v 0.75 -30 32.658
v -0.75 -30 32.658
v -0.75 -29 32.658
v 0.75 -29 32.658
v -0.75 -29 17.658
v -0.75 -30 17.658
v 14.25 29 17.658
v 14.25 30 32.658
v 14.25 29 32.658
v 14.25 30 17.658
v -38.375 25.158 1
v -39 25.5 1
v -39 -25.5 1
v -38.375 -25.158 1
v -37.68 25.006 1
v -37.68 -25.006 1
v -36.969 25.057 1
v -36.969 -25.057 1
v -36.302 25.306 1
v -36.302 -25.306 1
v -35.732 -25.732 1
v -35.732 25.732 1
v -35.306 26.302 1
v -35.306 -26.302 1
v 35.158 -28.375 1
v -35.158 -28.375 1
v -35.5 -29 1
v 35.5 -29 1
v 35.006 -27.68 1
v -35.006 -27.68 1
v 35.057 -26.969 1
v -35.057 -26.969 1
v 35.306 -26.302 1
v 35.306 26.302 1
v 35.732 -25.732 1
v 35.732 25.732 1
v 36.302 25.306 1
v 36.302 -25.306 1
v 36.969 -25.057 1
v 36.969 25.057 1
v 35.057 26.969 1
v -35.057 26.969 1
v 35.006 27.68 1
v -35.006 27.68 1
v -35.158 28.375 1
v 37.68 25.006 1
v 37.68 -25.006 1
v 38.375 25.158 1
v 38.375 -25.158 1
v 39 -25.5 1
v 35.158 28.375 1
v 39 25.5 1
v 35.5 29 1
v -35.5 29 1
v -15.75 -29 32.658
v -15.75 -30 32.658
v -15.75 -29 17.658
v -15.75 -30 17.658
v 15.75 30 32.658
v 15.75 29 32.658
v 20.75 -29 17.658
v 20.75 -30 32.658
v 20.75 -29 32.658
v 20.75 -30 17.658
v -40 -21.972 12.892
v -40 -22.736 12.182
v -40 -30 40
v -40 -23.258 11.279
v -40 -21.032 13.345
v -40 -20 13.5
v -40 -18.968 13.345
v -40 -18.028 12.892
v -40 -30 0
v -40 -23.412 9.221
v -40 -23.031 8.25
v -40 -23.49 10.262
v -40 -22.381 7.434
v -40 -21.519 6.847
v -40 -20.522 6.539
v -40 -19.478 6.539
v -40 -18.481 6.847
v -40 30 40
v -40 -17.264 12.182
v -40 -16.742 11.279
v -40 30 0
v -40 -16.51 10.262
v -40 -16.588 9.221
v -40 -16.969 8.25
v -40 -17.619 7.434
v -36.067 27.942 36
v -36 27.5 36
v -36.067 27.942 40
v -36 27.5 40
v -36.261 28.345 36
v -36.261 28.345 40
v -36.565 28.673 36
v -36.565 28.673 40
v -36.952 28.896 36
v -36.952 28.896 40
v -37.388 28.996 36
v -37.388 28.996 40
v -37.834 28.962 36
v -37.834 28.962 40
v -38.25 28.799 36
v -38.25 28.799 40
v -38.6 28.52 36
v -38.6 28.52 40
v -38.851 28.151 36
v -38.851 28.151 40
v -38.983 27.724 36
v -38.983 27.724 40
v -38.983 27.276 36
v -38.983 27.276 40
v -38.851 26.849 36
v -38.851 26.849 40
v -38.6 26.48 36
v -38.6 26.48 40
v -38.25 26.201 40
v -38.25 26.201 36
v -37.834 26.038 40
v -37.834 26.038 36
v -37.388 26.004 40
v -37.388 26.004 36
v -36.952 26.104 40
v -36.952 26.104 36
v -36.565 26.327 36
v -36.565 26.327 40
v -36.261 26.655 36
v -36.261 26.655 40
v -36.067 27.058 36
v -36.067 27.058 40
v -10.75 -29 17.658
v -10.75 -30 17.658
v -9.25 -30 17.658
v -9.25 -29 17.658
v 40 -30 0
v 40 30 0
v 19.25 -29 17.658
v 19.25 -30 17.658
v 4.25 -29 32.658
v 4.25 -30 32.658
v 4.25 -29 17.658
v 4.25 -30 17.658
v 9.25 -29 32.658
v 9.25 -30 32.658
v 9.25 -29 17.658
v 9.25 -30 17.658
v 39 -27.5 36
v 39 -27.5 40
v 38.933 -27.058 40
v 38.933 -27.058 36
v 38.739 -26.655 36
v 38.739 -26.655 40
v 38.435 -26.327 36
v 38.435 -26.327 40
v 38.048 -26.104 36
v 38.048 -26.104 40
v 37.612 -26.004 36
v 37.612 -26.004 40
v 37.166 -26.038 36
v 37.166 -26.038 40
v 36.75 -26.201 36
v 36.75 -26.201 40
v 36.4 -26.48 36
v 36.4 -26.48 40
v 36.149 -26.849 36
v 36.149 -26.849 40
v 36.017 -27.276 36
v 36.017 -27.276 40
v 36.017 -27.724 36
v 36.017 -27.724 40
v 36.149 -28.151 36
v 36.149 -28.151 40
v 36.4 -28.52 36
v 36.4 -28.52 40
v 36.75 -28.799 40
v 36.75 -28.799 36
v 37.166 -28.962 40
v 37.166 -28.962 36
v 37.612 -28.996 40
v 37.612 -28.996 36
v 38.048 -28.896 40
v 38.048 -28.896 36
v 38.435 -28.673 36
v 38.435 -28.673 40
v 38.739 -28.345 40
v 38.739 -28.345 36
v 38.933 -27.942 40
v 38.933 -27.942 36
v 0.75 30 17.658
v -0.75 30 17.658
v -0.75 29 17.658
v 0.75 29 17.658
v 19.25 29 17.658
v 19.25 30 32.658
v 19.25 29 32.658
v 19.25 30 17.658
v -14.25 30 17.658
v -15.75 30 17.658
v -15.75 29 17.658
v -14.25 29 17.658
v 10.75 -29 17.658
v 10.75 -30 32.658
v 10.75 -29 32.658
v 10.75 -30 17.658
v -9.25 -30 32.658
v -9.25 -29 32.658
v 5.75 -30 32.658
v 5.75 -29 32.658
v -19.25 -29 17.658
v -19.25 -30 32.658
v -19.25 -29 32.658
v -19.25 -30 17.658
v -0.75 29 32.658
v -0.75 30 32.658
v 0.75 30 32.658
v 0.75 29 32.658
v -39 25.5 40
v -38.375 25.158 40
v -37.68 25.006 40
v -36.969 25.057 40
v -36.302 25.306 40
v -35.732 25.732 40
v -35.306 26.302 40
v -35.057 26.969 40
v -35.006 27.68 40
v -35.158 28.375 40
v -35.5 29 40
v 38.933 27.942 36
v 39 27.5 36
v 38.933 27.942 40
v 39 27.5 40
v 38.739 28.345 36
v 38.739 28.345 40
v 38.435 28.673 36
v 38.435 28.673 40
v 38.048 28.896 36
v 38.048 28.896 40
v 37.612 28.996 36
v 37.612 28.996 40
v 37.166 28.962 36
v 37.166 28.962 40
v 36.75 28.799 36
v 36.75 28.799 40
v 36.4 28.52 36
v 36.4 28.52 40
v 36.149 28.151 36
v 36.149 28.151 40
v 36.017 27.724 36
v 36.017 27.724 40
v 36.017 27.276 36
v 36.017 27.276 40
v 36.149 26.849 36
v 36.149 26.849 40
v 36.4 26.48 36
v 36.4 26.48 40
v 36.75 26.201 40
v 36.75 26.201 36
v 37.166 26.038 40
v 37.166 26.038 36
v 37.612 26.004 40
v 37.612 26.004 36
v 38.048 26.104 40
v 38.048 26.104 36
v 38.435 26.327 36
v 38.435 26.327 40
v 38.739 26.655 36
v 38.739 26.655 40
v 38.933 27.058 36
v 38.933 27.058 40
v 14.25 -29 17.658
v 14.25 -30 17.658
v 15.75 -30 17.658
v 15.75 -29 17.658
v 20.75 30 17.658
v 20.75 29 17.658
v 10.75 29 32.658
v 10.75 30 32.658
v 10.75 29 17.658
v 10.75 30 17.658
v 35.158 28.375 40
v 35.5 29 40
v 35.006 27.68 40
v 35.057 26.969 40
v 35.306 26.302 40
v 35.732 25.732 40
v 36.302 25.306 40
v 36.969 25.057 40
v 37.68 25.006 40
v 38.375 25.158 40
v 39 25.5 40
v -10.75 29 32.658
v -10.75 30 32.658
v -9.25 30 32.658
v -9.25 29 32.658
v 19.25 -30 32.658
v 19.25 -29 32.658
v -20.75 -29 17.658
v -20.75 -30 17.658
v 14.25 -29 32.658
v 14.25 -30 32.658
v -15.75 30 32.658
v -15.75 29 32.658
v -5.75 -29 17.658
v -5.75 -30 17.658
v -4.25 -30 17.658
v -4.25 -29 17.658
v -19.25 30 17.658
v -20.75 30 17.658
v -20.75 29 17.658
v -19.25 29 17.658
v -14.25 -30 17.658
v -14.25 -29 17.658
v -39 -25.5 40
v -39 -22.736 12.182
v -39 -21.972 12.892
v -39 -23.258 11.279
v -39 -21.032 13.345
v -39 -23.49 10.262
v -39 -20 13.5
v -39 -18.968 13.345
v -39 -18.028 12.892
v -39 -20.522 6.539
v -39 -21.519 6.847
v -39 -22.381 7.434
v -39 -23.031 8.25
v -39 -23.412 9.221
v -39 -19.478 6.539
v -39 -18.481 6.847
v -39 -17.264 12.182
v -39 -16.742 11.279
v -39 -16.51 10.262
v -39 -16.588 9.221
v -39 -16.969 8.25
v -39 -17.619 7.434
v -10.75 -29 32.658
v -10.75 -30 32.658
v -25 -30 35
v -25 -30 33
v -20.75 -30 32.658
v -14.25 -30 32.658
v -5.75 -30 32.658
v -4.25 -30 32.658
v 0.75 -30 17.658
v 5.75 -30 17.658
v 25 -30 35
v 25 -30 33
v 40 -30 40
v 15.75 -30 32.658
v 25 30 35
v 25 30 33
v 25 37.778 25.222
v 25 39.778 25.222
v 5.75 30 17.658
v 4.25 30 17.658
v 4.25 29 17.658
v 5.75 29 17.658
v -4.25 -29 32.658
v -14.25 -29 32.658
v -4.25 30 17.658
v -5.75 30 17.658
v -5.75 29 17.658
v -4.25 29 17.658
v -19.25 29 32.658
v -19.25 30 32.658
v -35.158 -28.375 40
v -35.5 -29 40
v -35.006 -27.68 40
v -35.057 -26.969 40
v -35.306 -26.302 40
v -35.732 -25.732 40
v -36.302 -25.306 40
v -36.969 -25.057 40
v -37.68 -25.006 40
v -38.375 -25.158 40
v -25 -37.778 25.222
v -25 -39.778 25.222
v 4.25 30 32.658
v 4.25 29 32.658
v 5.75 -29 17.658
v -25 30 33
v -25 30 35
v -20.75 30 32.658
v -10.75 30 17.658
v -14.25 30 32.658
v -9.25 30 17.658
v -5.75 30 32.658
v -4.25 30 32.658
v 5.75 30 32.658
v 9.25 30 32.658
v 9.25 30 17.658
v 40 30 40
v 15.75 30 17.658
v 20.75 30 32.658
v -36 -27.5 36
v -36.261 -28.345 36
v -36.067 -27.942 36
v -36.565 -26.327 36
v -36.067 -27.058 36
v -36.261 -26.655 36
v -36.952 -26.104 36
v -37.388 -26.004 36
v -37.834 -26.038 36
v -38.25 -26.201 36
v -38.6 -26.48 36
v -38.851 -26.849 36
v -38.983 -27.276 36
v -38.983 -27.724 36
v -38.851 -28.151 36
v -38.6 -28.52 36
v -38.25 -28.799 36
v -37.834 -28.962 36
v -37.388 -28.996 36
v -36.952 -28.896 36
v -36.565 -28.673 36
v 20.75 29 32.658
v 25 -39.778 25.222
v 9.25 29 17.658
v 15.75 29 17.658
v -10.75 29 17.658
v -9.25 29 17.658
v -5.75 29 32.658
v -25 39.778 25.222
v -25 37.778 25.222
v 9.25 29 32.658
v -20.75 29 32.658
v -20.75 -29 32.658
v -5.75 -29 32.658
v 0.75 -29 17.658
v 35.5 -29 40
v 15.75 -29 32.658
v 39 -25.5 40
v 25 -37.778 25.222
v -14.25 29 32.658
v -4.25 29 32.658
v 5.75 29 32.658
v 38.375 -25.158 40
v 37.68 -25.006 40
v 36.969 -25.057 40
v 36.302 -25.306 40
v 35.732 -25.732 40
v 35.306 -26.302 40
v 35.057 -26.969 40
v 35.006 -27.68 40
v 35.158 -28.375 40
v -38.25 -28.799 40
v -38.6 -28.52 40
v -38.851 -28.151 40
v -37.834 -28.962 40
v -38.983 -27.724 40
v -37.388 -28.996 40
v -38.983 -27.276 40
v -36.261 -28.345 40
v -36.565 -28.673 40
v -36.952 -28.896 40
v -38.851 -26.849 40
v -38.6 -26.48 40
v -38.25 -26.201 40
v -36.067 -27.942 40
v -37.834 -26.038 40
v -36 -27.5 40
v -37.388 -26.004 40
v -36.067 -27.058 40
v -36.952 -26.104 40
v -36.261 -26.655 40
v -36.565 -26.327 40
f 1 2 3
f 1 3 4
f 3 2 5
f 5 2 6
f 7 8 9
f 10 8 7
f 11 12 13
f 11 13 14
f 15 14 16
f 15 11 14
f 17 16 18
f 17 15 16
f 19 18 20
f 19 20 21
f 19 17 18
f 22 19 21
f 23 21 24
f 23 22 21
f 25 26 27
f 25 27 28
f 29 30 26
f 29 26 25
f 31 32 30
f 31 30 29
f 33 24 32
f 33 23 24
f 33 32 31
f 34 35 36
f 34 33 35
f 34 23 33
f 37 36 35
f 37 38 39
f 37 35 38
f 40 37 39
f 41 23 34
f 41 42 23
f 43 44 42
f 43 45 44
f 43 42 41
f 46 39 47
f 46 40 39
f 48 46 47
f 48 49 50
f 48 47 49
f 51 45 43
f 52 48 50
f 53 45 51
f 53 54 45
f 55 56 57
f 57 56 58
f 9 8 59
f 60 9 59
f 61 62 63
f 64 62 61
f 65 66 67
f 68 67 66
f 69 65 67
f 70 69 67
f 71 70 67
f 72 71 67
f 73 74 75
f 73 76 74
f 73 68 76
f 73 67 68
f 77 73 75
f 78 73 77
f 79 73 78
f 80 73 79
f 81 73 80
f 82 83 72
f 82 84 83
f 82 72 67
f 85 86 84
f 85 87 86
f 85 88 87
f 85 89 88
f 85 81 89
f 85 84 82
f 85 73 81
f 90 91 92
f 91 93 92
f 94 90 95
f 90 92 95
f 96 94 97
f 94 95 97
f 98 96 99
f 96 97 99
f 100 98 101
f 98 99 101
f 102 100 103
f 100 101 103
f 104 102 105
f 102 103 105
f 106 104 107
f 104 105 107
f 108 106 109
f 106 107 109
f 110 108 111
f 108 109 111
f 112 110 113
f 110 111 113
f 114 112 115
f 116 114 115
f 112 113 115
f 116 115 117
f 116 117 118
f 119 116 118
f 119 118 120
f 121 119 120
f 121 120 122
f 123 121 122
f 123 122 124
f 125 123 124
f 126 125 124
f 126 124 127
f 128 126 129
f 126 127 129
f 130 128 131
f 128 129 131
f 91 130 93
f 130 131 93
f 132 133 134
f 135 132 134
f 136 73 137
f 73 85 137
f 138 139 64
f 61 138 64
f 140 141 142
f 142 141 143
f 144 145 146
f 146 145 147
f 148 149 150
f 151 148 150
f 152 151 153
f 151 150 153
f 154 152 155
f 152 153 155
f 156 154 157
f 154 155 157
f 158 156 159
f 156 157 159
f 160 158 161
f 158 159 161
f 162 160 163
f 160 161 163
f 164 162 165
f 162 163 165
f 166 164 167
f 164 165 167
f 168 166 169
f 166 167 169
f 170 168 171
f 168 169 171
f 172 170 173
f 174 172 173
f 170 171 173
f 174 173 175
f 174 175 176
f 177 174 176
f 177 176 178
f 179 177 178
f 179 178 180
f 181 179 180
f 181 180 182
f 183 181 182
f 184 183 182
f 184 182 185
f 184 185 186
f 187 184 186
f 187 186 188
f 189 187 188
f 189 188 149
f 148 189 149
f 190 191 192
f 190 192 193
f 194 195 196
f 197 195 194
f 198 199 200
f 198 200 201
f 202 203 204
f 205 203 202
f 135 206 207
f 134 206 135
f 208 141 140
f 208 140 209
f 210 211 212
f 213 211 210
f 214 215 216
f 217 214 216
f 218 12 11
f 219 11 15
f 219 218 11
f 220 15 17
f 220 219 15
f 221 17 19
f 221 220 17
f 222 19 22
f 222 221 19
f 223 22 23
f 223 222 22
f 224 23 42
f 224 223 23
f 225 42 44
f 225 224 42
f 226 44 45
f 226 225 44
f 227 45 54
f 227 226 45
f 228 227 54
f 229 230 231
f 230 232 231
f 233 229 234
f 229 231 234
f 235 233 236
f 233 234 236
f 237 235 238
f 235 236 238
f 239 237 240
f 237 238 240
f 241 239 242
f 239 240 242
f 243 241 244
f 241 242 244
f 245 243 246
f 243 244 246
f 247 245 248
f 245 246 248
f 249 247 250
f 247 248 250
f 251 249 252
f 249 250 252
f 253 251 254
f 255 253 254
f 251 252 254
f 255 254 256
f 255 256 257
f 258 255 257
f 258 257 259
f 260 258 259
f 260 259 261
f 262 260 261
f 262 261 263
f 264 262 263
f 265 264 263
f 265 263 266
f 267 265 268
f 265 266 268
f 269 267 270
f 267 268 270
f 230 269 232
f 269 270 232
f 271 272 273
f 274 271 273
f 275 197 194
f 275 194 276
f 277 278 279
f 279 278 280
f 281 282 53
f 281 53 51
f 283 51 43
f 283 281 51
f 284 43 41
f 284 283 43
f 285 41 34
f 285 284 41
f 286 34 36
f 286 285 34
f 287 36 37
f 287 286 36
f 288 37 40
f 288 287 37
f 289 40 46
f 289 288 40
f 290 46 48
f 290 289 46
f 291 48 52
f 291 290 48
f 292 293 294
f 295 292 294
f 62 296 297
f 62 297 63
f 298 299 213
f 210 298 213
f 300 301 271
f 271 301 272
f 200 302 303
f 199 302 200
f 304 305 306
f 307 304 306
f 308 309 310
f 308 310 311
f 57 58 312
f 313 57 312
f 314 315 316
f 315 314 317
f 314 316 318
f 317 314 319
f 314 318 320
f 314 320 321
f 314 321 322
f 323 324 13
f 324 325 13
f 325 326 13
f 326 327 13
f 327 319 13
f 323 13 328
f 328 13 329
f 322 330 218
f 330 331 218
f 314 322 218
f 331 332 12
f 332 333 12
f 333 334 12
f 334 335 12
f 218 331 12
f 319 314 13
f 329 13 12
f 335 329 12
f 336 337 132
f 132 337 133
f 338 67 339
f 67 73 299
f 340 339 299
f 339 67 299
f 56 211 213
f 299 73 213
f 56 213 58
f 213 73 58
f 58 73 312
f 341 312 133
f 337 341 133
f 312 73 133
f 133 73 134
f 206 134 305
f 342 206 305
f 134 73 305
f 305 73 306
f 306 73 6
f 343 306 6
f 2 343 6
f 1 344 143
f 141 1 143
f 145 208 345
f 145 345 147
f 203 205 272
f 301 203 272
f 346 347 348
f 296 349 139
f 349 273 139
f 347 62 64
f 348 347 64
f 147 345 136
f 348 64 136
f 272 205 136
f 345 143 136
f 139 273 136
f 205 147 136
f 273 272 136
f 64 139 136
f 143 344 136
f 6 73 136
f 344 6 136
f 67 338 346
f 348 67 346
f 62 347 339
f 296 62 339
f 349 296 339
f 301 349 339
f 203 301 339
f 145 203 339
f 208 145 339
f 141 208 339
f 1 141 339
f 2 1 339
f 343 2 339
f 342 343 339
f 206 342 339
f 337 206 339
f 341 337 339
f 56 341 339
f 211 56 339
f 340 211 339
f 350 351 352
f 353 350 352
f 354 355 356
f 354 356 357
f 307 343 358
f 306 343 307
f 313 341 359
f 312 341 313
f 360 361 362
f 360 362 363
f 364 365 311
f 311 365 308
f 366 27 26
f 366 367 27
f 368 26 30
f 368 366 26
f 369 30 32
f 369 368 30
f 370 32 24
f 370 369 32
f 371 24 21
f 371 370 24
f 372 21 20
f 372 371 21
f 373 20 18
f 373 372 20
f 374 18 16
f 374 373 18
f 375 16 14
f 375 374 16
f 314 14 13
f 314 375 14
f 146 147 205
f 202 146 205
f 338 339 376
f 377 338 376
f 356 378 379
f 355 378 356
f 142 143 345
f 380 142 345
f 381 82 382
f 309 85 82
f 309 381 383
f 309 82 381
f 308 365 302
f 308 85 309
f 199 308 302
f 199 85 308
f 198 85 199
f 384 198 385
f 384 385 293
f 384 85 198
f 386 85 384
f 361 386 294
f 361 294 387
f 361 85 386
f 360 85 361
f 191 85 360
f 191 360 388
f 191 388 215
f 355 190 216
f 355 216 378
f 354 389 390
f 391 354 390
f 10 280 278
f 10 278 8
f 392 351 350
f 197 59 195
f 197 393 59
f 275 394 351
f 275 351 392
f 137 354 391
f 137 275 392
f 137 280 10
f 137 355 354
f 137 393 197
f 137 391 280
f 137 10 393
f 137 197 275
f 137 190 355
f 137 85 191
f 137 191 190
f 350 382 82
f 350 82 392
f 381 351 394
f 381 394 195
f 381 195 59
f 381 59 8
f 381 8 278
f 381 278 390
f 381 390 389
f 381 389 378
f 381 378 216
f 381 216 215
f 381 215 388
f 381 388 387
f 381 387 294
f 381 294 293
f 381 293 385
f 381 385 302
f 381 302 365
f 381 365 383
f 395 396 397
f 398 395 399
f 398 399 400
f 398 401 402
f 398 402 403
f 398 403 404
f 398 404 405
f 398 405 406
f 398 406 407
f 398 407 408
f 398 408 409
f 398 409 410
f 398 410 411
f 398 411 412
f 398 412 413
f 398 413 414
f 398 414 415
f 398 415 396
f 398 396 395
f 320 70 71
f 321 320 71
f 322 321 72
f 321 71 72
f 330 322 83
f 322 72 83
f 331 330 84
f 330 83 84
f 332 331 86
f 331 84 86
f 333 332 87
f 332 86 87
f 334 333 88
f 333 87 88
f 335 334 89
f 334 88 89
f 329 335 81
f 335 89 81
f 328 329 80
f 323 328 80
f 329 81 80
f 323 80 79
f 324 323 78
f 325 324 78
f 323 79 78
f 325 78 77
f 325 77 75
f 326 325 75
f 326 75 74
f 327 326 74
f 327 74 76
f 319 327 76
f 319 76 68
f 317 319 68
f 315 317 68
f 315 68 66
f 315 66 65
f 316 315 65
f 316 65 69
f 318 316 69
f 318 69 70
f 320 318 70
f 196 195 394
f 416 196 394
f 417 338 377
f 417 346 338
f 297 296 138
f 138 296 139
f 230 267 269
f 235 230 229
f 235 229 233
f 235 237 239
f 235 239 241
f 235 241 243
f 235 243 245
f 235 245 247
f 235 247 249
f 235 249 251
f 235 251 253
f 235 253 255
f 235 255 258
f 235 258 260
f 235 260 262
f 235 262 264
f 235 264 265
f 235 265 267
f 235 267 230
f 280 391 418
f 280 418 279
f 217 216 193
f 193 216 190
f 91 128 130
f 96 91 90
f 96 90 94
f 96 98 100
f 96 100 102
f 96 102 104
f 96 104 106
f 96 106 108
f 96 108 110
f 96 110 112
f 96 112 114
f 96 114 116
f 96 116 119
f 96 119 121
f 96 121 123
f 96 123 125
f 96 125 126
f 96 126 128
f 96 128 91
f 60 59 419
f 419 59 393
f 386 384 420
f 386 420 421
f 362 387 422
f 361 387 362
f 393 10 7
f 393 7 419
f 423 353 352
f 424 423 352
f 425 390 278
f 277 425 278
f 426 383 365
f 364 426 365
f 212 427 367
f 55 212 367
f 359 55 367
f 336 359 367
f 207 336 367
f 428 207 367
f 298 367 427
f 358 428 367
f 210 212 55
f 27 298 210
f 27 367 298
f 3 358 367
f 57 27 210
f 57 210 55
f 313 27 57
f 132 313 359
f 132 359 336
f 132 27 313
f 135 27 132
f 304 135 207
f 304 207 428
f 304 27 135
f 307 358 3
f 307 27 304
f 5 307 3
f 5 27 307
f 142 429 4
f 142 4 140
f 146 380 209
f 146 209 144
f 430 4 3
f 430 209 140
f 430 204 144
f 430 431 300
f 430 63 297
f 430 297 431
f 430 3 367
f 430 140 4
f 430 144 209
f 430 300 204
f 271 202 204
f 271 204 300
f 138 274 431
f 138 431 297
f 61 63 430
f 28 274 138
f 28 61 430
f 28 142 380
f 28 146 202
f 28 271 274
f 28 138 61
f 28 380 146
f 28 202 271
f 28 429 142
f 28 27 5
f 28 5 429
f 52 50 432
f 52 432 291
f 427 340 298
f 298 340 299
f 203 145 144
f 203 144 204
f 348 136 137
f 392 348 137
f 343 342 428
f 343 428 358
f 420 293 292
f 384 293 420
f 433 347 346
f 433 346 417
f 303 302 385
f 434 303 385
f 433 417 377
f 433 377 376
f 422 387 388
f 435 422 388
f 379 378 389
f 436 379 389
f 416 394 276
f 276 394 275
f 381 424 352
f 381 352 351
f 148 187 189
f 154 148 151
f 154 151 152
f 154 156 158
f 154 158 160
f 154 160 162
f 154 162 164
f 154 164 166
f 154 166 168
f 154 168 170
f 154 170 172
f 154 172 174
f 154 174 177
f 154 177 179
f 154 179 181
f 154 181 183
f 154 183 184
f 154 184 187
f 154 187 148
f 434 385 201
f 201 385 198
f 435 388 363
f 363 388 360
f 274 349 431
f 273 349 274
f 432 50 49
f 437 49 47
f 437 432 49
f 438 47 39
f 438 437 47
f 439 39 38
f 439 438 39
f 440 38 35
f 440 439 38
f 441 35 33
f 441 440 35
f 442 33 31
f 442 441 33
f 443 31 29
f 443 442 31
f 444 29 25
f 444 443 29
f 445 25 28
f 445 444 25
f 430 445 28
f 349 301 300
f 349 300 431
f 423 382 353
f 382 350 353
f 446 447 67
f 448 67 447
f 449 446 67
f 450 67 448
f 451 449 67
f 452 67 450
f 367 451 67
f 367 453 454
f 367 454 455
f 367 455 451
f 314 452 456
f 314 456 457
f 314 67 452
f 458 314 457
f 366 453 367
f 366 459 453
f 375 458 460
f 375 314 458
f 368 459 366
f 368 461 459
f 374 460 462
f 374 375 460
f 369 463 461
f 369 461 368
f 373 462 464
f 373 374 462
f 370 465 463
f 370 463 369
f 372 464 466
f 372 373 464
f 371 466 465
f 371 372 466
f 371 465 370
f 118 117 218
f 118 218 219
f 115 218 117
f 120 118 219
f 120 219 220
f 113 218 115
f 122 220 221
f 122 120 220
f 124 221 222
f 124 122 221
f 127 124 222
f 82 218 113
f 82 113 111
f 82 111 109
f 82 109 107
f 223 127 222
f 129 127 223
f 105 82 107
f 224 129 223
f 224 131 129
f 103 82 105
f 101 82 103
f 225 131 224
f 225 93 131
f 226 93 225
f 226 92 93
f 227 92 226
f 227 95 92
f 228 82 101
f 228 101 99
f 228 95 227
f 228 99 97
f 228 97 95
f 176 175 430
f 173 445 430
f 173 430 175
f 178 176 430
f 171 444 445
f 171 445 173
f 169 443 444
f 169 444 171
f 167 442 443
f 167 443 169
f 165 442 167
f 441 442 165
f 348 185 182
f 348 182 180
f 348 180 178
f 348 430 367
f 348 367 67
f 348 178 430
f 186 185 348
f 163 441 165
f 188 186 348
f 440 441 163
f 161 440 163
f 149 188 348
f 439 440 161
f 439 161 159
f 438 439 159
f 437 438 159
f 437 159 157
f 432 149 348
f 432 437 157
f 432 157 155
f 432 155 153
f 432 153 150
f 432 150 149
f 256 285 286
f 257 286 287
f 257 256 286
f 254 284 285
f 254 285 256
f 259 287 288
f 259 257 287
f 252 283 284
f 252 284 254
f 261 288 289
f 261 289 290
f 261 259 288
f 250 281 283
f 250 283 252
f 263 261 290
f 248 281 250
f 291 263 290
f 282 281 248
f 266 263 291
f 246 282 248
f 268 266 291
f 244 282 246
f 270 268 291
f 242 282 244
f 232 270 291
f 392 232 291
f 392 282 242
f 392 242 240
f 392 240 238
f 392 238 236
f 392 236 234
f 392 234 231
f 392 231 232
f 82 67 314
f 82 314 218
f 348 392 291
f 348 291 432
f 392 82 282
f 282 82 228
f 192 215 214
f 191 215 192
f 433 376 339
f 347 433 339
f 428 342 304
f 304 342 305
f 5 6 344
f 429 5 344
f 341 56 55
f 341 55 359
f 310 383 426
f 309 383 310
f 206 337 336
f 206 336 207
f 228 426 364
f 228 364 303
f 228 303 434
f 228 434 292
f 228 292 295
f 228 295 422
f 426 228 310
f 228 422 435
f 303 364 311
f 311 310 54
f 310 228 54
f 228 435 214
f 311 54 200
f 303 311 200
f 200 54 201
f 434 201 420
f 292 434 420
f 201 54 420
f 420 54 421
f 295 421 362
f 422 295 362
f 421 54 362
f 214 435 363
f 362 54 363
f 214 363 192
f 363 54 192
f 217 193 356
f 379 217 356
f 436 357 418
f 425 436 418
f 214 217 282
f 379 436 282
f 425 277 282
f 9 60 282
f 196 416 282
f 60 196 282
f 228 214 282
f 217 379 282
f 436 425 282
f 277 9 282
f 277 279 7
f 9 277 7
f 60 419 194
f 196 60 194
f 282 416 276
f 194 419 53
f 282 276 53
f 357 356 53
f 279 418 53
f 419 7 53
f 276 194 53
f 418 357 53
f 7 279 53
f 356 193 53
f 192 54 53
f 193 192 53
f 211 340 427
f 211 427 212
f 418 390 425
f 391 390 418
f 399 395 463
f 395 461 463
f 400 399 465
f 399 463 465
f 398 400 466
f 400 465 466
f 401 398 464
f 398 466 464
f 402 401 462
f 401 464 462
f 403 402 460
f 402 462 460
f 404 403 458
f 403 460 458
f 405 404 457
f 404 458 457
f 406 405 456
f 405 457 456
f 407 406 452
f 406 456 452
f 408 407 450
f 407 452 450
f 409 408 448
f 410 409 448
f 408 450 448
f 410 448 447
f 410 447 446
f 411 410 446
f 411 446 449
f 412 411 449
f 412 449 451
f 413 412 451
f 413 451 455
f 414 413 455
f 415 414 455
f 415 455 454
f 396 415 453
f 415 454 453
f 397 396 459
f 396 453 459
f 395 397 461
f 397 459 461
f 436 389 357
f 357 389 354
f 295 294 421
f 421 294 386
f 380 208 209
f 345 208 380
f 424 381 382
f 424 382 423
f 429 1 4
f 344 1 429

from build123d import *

# Parameters (mm, degrees)
CROQUIS1_W              = 80
CROQUIS1_H              = 60
SALIENTE_EXTRUIR1_DEPTH = 40
VACIADO1_T              = -1
CROQUIS2_R              = 2.5
CROQUIS2_R_2            = 1.5
SALIENTE_EXTRUIR2_DEPTH = 40
SALIENTE_EXTRUIR3_DEPTH = 25
CROQUIS4_W              = 1.5
CROQUIS4_H              = 15
CORTAR_EXTRUIR1_DEPTH   = 1
CROQUIS5_R              = 1.5
SALIENTE_EXTRUIR4_DEPTH = 35
CORTAR_EXTRUIR2_REACH   = 82
CROQUIS6_R              = 3.5


with BuildPart() as part:
    # Croquis1 → Saliente-Extruir1 (new body)
    with BuildSketch(Plane.XY):
        Rectangle(CROQUIS1_W, CROQUIS1_H)
    extrude(amount=SALIENTE_EXTRUIR1_DEPTH)

    # Vaciado1
    vaciado1_openings = [part.faces().sort_by_distance(p)[0] for p in [
        (0, 0, 40),
    ]]
    offset(amount=VACIADO1_T, openings=vaciado1_openings, kind=Kind.INTERSECTION)

    # Croquis2 → Saliente-Extruir2 (add)
    with BuildSketch(Plane.XY.offset(40)):
        with Locations((-37.5, 27.5)):
            Circle(CROQUIS2_R)
        with Locations((-37.5, 27.5)):
            Circle(CROQUIS2_R_2, mode=Mode.SUBTRACT)
        with Locations((37.5, 27.5)):
            Circle(CROQUIS2_R)
        with Locations((37.5, 27.5)):
            Circle(CROQUIS2_R_2, mode=Mode.SUBTRACT)
        with Locations((37.5, -27.5)):
            Circle(CROQUIS2_R)
        with Locations((37.5, -27.5)):
            Circle(CROQUIS2_R_2, mode=Mode.SUBTRACT)
        with Locations((-37.5, -27.5)):
            Circle(CROQUIS2_R)
        with Locations((-37.5, -27.5)):
            Circle(CROQUIS2_R_2, mode=Mode.SUBTRACT)
    extrude(amount=-SALIENTE_EXTRUIR2_DEPTH)

    # Croquis3 → Saliente-Extruir3 (add, symmetric)
    with BuildSketch(Plane(origin=(0, 0, 0), x_dir=(0, 0, -1), z_dir=(1, 0, 0))):
        Polygon((-35, -30), (-25.221641576, -39.778358424), (-25.221641576, -37.778358424), (-33.224472237, -29.775527763), (-35, -29.775527763), align=None)
    saliente_extruir3 = extrude(amount=SALIENTE_EXTRUIR3_DEPTH, both=True)

    # Simetría1: Saliente-Extruir3 across plane
    add(saliente_extruir3.mirror(Plane.ZX))

    # Croquis4 → Cortar-Extruir1 (cut)
    with BuildSketch(Plane(origin=(0, 30, 0), x_dir=(1, 0, 0), z_dir=(0, 1, 0))):
        with Locations((5, -25.157633817)):
            Rectangle(CROQUIS4_W, CROQUIS4_H)
        with Locations((0, -25.157633817)):
            Rectangle(CROQUIS4_W, CROQUIS4_H)
        with Locations((10, -25.157633817)):
            Rectangle(CROQUIS4_W, CROQUIS4_H)
        with Locations((15, -25.157633817)):
            Rectangle(CROQUIS4_W, CROQUIS4_H)
        with Locations((20, -25.157633817)):
            Rectangle(CROQUIS4_W, CROQUIS4_H)
        with Locations((-5, -25.157633817)):
            Rectangle(CROQUIS4_W, CROQUIS4_H)
        with Locations((-10, -25.157633817)):
            Rectangle(CROQUIS4_W, CROQUIS4_H)
        with Locations((-15, -25.157633817)):
            Rectangle(CROQUIS4_W, CROQUIS4_H)
        with Locations((-20, -25.157633817)):
            Rectangle(CROQUIS4_W, CROQUIS4_H)
    cortar_extruir1 = extrude(amount=-CORTAR_EXTRUIR1_DEPTH, mode=Mode.SUBTRACT)

    # Simetría2: Cortar-Extruir1 across plane
    add(cortar_extruir1.mirror(Plane.ZX), mode=Mode.SUBTRACT)

    # Croquis5 → Saliente-Extruir4 (add)
    with BuildSketch(Plane.XY.offset(1)):
        with Locations((37.5, -27.5)):
            Circle(CROQUIS5_R)
        with Locations((37.5, 27.5)):
            Circle(CROQUIS5_R)
        with Locations((-37.5, 27.5)):
            Circle(CROQUIS5_R)
        with Locations((-37.5, -27.5)):
            Circle(CROQUIS5_R)
    extrude(amount=SALIENTE_EXTRUIR4_DEPTH)

    # Croquis6 → Cortar-Extruir2 (cut, up to next)
    with BuildSketch(Plane.ZY.offset(40), mode=Mode.PRIVATE) as cortar_extruir2_sk1:
        with Locations((10, -20)):
            Circle(CROQUIS6_R)
    cortar_extruir2_tool1 = extrude(cortar_extruir2_sk1.sketch, amount=-CORTAR_EXTRUIR2_REACH, mode=Mode.PRIVATE) & part.part
    add(cortar_extruir2_tool1.solids().sort_by_distance((-40, -20, 10))[0], mode=Mode.SUBTRACT)


solid = part.part
